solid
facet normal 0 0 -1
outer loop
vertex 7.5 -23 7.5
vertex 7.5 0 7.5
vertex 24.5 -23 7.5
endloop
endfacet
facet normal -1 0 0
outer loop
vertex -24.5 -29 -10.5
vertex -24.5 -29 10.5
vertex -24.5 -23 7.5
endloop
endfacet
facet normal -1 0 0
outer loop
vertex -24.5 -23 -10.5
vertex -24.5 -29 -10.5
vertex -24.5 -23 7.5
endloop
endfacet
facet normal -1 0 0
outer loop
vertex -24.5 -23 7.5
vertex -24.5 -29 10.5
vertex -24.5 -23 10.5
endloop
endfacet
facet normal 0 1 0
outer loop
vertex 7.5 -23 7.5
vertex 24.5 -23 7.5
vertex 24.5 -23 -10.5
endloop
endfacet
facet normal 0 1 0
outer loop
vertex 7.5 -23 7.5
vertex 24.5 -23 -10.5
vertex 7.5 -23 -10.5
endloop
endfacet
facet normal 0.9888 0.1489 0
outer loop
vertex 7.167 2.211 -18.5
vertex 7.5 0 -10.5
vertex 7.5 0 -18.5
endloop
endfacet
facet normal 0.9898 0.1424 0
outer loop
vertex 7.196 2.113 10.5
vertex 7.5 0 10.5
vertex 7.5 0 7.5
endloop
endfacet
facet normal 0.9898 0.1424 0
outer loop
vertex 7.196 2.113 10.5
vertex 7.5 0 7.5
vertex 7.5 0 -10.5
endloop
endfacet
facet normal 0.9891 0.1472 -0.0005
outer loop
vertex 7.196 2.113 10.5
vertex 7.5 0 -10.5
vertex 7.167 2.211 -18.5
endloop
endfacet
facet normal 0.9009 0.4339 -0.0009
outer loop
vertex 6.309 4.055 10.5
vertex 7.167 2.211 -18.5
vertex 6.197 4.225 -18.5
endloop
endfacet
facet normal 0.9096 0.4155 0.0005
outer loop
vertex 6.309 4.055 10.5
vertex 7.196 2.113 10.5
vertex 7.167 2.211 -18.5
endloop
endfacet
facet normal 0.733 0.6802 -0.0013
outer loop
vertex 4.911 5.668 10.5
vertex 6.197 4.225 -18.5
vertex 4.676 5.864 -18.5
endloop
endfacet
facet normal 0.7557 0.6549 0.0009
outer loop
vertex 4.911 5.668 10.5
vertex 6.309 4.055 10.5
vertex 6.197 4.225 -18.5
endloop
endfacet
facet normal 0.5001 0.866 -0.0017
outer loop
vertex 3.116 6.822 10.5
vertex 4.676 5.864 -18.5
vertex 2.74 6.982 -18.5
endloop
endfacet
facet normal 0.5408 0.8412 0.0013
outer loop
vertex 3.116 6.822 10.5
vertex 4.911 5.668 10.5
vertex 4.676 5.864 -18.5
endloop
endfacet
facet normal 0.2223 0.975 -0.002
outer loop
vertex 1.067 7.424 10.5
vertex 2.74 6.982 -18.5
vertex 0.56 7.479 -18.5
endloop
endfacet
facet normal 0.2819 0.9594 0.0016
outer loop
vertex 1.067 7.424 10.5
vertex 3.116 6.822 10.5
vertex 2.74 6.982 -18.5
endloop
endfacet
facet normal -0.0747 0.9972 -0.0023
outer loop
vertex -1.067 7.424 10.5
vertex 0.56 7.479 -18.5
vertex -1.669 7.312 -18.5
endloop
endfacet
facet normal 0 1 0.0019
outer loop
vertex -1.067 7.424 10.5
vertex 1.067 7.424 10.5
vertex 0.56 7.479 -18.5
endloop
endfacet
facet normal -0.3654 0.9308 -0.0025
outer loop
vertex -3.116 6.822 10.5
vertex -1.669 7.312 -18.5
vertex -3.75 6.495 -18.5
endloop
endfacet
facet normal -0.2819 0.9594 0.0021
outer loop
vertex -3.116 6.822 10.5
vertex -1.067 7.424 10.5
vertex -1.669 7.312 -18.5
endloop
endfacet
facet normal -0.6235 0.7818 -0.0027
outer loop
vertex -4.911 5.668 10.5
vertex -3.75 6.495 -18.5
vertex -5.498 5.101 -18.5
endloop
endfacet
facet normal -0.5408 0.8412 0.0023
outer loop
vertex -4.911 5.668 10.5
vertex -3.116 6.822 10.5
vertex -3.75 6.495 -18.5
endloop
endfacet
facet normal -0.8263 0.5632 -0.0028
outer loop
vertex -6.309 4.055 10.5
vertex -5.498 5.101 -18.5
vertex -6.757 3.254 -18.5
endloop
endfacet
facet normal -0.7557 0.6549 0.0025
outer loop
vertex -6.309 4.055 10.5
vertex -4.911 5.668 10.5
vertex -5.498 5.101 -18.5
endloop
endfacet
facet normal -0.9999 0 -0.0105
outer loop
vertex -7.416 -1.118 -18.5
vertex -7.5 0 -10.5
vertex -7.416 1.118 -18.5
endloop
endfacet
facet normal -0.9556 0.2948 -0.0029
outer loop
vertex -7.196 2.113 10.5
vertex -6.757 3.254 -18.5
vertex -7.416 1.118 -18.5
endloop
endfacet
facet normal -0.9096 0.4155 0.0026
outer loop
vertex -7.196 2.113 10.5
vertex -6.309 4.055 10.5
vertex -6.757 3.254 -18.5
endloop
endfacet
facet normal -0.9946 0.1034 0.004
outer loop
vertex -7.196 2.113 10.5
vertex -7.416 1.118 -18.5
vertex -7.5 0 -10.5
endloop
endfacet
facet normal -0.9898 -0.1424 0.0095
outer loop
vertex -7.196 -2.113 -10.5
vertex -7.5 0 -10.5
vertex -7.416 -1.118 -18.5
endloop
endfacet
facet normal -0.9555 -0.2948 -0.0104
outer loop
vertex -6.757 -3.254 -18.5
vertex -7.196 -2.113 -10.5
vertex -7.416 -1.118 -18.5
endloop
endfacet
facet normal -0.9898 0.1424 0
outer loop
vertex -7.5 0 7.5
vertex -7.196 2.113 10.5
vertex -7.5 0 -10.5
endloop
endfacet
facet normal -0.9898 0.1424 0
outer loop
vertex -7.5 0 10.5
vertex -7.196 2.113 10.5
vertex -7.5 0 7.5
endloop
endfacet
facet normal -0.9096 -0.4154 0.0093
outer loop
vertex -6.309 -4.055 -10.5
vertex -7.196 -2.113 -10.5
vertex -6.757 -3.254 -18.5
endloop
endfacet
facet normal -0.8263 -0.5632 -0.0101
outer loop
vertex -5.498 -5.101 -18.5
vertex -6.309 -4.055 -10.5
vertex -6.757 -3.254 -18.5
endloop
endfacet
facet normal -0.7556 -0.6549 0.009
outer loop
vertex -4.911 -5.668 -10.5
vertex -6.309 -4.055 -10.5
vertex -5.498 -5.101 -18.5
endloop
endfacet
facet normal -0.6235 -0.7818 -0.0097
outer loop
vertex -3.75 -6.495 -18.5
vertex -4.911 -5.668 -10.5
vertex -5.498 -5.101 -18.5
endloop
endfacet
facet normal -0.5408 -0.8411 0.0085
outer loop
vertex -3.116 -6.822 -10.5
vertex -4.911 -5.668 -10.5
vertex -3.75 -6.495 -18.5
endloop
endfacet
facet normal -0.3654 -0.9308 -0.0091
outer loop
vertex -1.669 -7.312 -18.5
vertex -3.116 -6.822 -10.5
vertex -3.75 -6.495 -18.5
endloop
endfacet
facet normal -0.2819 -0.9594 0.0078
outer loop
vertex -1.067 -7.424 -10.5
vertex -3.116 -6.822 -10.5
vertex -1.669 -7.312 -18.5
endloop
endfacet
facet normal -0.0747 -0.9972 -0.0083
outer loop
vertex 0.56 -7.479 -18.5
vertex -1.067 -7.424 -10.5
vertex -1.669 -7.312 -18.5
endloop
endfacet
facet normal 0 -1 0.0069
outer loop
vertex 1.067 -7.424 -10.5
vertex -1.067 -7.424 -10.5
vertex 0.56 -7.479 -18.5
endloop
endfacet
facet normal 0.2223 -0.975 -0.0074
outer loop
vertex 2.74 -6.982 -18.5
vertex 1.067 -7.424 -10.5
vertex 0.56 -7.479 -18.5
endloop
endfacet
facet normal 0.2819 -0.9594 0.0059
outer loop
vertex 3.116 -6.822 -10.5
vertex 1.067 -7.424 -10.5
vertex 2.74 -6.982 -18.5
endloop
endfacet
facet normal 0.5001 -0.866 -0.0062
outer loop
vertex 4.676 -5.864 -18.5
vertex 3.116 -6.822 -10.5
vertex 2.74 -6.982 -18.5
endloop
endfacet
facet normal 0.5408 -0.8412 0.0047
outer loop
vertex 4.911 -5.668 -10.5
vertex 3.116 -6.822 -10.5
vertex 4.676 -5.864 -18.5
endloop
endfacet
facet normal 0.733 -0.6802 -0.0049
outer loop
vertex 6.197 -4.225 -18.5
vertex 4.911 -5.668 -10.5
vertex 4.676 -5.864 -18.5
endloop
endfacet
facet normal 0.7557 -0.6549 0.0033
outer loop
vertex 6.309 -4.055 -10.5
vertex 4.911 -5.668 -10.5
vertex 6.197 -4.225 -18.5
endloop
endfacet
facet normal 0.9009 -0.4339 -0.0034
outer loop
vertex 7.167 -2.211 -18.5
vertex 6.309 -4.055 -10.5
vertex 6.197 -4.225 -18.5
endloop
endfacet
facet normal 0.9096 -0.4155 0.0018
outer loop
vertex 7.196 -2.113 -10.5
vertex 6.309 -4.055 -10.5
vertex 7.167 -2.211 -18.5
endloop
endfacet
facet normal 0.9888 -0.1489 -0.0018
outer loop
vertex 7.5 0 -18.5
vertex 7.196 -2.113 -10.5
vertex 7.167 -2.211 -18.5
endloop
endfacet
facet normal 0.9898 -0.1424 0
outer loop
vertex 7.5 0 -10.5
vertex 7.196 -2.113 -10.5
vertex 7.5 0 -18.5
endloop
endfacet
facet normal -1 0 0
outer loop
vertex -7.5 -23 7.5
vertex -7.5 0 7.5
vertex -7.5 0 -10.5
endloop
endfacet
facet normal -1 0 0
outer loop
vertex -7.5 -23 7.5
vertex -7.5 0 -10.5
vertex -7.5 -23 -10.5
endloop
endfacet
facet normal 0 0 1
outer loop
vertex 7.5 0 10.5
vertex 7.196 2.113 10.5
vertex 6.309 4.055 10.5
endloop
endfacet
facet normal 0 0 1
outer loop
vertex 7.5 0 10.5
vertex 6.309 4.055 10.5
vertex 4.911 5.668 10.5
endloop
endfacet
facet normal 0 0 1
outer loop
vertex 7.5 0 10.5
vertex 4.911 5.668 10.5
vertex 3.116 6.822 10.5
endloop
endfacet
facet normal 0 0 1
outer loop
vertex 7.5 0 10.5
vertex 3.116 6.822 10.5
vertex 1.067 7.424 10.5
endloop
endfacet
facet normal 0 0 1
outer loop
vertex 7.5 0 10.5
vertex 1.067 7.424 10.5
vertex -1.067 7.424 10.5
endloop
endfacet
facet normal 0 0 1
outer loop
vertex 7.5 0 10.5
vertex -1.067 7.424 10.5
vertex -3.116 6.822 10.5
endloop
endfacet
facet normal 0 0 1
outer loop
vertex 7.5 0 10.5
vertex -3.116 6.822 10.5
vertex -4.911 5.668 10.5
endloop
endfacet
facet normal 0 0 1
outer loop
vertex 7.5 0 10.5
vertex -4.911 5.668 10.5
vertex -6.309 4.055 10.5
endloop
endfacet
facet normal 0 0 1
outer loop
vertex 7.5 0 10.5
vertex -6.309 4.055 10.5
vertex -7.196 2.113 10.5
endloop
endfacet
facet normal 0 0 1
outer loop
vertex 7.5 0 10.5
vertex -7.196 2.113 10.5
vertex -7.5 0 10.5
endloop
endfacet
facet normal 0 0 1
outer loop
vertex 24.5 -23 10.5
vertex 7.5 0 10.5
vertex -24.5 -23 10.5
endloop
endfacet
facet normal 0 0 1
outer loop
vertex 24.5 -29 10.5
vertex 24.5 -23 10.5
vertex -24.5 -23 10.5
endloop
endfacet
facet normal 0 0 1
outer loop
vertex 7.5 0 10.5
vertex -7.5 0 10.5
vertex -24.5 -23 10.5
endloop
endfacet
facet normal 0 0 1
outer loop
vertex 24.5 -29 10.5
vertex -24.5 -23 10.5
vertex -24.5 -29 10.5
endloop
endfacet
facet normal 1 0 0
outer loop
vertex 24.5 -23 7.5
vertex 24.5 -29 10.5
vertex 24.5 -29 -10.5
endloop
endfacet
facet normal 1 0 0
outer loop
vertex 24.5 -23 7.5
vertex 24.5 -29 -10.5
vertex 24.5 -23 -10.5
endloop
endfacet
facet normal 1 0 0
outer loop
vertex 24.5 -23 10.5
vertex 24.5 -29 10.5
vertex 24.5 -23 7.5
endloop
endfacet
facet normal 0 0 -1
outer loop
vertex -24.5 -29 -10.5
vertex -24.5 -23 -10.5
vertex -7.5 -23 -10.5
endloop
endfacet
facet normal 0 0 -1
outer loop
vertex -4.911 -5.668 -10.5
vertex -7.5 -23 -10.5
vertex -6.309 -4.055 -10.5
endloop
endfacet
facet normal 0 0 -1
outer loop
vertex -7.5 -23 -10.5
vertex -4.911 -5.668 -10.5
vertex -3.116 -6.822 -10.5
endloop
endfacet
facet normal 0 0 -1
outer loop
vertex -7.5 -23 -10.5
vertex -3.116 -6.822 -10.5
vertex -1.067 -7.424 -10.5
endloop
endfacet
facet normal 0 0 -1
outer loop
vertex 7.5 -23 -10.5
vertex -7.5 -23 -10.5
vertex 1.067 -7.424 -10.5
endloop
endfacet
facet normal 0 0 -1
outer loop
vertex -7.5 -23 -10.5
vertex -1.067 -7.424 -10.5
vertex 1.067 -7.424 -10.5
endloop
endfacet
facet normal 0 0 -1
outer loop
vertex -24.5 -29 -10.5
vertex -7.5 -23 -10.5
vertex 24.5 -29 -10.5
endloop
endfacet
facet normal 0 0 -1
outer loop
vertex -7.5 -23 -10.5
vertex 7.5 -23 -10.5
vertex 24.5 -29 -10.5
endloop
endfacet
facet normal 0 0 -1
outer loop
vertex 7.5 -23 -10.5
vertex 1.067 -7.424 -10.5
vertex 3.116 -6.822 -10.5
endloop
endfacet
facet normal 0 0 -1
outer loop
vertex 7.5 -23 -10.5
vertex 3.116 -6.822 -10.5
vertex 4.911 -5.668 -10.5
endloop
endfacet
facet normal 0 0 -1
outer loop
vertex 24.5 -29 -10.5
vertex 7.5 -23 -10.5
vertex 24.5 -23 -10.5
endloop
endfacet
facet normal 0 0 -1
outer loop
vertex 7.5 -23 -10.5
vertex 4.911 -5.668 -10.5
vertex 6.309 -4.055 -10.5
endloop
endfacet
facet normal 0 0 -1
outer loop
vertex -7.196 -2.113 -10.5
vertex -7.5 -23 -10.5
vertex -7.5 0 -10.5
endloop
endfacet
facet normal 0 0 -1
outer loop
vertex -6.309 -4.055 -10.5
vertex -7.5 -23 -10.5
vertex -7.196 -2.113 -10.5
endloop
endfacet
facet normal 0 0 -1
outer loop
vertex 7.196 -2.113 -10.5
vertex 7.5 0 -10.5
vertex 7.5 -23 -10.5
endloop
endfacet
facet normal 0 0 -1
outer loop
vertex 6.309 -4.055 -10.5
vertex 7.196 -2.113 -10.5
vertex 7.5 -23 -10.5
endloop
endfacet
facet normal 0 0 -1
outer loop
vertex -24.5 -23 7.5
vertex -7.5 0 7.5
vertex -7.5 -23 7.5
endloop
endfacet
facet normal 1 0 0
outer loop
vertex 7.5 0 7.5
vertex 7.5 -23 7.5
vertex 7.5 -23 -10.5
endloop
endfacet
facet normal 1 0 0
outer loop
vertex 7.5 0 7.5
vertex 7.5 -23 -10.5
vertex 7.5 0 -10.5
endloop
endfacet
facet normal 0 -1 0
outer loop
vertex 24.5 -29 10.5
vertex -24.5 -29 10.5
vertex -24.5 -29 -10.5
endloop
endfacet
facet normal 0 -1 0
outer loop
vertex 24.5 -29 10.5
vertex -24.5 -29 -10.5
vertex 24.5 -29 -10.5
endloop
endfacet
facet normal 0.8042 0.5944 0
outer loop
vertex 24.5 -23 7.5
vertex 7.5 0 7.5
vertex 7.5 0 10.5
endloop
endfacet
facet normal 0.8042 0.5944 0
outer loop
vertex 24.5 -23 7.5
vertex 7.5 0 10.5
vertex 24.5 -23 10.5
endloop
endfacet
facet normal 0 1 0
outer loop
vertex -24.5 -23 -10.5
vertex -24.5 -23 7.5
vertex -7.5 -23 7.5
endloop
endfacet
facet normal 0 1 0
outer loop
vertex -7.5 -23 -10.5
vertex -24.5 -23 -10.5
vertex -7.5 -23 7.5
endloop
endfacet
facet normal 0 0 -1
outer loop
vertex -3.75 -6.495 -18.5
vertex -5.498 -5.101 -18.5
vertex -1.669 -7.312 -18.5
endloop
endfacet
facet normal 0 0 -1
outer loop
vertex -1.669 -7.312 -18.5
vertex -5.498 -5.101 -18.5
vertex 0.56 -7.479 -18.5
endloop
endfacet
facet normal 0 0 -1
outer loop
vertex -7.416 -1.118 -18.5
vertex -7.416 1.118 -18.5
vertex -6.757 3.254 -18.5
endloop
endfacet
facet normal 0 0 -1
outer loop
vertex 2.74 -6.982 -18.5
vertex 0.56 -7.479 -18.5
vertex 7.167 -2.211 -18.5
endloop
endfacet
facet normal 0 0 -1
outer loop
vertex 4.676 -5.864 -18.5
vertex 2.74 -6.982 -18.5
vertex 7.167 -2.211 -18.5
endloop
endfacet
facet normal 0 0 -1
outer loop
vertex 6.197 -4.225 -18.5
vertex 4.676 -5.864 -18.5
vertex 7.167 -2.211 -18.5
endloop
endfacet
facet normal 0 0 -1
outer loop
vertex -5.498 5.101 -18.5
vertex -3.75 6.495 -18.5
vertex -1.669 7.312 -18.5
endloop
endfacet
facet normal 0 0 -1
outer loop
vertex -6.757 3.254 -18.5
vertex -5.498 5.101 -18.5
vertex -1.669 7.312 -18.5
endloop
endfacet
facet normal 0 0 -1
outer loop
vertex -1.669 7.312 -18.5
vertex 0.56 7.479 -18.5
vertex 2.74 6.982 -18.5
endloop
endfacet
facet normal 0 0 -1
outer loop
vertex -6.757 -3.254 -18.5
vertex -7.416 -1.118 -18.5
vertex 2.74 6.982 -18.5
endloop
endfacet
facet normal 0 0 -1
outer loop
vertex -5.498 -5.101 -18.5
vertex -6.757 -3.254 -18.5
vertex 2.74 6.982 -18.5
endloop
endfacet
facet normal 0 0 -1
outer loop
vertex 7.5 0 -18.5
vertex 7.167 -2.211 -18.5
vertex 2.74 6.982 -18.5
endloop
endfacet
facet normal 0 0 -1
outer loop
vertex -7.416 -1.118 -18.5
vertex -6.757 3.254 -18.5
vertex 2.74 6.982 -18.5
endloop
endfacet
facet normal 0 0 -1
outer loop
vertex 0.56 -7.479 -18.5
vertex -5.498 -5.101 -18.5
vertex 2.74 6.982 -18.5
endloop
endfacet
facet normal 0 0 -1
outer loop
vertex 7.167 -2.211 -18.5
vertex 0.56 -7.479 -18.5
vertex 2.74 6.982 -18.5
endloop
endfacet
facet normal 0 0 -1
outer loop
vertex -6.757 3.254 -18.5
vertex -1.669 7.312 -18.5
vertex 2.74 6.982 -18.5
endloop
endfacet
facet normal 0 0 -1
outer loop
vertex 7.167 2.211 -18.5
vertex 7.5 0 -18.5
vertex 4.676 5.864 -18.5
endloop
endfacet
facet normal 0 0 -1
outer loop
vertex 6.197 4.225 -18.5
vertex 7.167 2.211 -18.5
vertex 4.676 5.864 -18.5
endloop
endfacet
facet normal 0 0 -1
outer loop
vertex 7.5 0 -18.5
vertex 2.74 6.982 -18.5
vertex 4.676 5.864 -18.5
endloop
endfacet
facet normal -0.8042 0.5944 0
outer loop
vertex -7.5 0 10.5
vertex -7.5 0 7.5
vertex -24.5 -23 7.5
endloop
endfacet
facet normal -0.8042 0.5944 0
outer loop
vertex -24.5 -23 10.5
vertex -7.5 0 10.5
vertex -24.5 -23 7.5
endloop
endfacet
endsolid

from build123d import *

# Parameters (mm, degrees)
MAIN_BODY_DEPTH = 10.5
RIB1_REACH      = 45.385
SKETCH2_WALL_W  = 117.37050971
SKETCH2_WALL_H  = 3
SKETCH3_R       = 7.5
SHAFT_DEPTH     = 8


with BuildPart() as part:
    # Sketch1 → Main Body (new, symmetric)
    with BuildSketch(Plane.XY):
        with BuildLine():
            Line((-7.5, 0), (-7.5, -29))
            Line((-7.5, -29), (24.5, -29))
            Line((24.5, -29), (24.5, -23))
            Line((24.5, -23), (7.5, -23))
            Line((7.5, -23), (7.5, 0))
            ThreePointArc((7.5, 0), (0, 7.5), (-7.5, 0))
        make_face()
    main_body = extrude(amount=MAIN_BODY_DEPTH, both=True)

    # Sketch2 wall → Rib1 (add, up to next)
    with BuildSketch(Plane(origin=(16, -11.5, 10.5), x_dir=(0.594391061084, -0.804176141466, 0), z_dir=(0.804176141466, 0.594391061084, 0)), mode=Mode.PRIVATE) as rib1_sk1:
        with Locations((0, 1.5)):
            Rectangle(SKETCH2_WALL_W, SKETCH2_WALL_H)
    rib1_tool1 = extrude(rib1_sk1.sketch, amount=-RIB1_REACH, mode=Mode.PRIVATE) - part.part
    rib1 = rib1_tool1.solids().sort_by_distance((16, -11.5, 10.5))[0]
    add(rib1)

    # Sketch3 → Shaft (add)
    with BuildSketch(Plane.XY.offset(-10.5)):
        Circle(SKETCH3_R)
    extrude(amount=-SHAFT_DEPTH)

    # Mirror2: Main Body, Rib1 across plane
    add(main_body.mirror(Plane(origin=(0, 0, 0), x_dir=(0, 0, 1), z_dir=(1, 0, 0))))
    add(rib1.mirror(Plane(origin=(0, 0, 0), x_dir=(0, 0, 1), z_dir=(1, 0, 0))))


solid = part.part
